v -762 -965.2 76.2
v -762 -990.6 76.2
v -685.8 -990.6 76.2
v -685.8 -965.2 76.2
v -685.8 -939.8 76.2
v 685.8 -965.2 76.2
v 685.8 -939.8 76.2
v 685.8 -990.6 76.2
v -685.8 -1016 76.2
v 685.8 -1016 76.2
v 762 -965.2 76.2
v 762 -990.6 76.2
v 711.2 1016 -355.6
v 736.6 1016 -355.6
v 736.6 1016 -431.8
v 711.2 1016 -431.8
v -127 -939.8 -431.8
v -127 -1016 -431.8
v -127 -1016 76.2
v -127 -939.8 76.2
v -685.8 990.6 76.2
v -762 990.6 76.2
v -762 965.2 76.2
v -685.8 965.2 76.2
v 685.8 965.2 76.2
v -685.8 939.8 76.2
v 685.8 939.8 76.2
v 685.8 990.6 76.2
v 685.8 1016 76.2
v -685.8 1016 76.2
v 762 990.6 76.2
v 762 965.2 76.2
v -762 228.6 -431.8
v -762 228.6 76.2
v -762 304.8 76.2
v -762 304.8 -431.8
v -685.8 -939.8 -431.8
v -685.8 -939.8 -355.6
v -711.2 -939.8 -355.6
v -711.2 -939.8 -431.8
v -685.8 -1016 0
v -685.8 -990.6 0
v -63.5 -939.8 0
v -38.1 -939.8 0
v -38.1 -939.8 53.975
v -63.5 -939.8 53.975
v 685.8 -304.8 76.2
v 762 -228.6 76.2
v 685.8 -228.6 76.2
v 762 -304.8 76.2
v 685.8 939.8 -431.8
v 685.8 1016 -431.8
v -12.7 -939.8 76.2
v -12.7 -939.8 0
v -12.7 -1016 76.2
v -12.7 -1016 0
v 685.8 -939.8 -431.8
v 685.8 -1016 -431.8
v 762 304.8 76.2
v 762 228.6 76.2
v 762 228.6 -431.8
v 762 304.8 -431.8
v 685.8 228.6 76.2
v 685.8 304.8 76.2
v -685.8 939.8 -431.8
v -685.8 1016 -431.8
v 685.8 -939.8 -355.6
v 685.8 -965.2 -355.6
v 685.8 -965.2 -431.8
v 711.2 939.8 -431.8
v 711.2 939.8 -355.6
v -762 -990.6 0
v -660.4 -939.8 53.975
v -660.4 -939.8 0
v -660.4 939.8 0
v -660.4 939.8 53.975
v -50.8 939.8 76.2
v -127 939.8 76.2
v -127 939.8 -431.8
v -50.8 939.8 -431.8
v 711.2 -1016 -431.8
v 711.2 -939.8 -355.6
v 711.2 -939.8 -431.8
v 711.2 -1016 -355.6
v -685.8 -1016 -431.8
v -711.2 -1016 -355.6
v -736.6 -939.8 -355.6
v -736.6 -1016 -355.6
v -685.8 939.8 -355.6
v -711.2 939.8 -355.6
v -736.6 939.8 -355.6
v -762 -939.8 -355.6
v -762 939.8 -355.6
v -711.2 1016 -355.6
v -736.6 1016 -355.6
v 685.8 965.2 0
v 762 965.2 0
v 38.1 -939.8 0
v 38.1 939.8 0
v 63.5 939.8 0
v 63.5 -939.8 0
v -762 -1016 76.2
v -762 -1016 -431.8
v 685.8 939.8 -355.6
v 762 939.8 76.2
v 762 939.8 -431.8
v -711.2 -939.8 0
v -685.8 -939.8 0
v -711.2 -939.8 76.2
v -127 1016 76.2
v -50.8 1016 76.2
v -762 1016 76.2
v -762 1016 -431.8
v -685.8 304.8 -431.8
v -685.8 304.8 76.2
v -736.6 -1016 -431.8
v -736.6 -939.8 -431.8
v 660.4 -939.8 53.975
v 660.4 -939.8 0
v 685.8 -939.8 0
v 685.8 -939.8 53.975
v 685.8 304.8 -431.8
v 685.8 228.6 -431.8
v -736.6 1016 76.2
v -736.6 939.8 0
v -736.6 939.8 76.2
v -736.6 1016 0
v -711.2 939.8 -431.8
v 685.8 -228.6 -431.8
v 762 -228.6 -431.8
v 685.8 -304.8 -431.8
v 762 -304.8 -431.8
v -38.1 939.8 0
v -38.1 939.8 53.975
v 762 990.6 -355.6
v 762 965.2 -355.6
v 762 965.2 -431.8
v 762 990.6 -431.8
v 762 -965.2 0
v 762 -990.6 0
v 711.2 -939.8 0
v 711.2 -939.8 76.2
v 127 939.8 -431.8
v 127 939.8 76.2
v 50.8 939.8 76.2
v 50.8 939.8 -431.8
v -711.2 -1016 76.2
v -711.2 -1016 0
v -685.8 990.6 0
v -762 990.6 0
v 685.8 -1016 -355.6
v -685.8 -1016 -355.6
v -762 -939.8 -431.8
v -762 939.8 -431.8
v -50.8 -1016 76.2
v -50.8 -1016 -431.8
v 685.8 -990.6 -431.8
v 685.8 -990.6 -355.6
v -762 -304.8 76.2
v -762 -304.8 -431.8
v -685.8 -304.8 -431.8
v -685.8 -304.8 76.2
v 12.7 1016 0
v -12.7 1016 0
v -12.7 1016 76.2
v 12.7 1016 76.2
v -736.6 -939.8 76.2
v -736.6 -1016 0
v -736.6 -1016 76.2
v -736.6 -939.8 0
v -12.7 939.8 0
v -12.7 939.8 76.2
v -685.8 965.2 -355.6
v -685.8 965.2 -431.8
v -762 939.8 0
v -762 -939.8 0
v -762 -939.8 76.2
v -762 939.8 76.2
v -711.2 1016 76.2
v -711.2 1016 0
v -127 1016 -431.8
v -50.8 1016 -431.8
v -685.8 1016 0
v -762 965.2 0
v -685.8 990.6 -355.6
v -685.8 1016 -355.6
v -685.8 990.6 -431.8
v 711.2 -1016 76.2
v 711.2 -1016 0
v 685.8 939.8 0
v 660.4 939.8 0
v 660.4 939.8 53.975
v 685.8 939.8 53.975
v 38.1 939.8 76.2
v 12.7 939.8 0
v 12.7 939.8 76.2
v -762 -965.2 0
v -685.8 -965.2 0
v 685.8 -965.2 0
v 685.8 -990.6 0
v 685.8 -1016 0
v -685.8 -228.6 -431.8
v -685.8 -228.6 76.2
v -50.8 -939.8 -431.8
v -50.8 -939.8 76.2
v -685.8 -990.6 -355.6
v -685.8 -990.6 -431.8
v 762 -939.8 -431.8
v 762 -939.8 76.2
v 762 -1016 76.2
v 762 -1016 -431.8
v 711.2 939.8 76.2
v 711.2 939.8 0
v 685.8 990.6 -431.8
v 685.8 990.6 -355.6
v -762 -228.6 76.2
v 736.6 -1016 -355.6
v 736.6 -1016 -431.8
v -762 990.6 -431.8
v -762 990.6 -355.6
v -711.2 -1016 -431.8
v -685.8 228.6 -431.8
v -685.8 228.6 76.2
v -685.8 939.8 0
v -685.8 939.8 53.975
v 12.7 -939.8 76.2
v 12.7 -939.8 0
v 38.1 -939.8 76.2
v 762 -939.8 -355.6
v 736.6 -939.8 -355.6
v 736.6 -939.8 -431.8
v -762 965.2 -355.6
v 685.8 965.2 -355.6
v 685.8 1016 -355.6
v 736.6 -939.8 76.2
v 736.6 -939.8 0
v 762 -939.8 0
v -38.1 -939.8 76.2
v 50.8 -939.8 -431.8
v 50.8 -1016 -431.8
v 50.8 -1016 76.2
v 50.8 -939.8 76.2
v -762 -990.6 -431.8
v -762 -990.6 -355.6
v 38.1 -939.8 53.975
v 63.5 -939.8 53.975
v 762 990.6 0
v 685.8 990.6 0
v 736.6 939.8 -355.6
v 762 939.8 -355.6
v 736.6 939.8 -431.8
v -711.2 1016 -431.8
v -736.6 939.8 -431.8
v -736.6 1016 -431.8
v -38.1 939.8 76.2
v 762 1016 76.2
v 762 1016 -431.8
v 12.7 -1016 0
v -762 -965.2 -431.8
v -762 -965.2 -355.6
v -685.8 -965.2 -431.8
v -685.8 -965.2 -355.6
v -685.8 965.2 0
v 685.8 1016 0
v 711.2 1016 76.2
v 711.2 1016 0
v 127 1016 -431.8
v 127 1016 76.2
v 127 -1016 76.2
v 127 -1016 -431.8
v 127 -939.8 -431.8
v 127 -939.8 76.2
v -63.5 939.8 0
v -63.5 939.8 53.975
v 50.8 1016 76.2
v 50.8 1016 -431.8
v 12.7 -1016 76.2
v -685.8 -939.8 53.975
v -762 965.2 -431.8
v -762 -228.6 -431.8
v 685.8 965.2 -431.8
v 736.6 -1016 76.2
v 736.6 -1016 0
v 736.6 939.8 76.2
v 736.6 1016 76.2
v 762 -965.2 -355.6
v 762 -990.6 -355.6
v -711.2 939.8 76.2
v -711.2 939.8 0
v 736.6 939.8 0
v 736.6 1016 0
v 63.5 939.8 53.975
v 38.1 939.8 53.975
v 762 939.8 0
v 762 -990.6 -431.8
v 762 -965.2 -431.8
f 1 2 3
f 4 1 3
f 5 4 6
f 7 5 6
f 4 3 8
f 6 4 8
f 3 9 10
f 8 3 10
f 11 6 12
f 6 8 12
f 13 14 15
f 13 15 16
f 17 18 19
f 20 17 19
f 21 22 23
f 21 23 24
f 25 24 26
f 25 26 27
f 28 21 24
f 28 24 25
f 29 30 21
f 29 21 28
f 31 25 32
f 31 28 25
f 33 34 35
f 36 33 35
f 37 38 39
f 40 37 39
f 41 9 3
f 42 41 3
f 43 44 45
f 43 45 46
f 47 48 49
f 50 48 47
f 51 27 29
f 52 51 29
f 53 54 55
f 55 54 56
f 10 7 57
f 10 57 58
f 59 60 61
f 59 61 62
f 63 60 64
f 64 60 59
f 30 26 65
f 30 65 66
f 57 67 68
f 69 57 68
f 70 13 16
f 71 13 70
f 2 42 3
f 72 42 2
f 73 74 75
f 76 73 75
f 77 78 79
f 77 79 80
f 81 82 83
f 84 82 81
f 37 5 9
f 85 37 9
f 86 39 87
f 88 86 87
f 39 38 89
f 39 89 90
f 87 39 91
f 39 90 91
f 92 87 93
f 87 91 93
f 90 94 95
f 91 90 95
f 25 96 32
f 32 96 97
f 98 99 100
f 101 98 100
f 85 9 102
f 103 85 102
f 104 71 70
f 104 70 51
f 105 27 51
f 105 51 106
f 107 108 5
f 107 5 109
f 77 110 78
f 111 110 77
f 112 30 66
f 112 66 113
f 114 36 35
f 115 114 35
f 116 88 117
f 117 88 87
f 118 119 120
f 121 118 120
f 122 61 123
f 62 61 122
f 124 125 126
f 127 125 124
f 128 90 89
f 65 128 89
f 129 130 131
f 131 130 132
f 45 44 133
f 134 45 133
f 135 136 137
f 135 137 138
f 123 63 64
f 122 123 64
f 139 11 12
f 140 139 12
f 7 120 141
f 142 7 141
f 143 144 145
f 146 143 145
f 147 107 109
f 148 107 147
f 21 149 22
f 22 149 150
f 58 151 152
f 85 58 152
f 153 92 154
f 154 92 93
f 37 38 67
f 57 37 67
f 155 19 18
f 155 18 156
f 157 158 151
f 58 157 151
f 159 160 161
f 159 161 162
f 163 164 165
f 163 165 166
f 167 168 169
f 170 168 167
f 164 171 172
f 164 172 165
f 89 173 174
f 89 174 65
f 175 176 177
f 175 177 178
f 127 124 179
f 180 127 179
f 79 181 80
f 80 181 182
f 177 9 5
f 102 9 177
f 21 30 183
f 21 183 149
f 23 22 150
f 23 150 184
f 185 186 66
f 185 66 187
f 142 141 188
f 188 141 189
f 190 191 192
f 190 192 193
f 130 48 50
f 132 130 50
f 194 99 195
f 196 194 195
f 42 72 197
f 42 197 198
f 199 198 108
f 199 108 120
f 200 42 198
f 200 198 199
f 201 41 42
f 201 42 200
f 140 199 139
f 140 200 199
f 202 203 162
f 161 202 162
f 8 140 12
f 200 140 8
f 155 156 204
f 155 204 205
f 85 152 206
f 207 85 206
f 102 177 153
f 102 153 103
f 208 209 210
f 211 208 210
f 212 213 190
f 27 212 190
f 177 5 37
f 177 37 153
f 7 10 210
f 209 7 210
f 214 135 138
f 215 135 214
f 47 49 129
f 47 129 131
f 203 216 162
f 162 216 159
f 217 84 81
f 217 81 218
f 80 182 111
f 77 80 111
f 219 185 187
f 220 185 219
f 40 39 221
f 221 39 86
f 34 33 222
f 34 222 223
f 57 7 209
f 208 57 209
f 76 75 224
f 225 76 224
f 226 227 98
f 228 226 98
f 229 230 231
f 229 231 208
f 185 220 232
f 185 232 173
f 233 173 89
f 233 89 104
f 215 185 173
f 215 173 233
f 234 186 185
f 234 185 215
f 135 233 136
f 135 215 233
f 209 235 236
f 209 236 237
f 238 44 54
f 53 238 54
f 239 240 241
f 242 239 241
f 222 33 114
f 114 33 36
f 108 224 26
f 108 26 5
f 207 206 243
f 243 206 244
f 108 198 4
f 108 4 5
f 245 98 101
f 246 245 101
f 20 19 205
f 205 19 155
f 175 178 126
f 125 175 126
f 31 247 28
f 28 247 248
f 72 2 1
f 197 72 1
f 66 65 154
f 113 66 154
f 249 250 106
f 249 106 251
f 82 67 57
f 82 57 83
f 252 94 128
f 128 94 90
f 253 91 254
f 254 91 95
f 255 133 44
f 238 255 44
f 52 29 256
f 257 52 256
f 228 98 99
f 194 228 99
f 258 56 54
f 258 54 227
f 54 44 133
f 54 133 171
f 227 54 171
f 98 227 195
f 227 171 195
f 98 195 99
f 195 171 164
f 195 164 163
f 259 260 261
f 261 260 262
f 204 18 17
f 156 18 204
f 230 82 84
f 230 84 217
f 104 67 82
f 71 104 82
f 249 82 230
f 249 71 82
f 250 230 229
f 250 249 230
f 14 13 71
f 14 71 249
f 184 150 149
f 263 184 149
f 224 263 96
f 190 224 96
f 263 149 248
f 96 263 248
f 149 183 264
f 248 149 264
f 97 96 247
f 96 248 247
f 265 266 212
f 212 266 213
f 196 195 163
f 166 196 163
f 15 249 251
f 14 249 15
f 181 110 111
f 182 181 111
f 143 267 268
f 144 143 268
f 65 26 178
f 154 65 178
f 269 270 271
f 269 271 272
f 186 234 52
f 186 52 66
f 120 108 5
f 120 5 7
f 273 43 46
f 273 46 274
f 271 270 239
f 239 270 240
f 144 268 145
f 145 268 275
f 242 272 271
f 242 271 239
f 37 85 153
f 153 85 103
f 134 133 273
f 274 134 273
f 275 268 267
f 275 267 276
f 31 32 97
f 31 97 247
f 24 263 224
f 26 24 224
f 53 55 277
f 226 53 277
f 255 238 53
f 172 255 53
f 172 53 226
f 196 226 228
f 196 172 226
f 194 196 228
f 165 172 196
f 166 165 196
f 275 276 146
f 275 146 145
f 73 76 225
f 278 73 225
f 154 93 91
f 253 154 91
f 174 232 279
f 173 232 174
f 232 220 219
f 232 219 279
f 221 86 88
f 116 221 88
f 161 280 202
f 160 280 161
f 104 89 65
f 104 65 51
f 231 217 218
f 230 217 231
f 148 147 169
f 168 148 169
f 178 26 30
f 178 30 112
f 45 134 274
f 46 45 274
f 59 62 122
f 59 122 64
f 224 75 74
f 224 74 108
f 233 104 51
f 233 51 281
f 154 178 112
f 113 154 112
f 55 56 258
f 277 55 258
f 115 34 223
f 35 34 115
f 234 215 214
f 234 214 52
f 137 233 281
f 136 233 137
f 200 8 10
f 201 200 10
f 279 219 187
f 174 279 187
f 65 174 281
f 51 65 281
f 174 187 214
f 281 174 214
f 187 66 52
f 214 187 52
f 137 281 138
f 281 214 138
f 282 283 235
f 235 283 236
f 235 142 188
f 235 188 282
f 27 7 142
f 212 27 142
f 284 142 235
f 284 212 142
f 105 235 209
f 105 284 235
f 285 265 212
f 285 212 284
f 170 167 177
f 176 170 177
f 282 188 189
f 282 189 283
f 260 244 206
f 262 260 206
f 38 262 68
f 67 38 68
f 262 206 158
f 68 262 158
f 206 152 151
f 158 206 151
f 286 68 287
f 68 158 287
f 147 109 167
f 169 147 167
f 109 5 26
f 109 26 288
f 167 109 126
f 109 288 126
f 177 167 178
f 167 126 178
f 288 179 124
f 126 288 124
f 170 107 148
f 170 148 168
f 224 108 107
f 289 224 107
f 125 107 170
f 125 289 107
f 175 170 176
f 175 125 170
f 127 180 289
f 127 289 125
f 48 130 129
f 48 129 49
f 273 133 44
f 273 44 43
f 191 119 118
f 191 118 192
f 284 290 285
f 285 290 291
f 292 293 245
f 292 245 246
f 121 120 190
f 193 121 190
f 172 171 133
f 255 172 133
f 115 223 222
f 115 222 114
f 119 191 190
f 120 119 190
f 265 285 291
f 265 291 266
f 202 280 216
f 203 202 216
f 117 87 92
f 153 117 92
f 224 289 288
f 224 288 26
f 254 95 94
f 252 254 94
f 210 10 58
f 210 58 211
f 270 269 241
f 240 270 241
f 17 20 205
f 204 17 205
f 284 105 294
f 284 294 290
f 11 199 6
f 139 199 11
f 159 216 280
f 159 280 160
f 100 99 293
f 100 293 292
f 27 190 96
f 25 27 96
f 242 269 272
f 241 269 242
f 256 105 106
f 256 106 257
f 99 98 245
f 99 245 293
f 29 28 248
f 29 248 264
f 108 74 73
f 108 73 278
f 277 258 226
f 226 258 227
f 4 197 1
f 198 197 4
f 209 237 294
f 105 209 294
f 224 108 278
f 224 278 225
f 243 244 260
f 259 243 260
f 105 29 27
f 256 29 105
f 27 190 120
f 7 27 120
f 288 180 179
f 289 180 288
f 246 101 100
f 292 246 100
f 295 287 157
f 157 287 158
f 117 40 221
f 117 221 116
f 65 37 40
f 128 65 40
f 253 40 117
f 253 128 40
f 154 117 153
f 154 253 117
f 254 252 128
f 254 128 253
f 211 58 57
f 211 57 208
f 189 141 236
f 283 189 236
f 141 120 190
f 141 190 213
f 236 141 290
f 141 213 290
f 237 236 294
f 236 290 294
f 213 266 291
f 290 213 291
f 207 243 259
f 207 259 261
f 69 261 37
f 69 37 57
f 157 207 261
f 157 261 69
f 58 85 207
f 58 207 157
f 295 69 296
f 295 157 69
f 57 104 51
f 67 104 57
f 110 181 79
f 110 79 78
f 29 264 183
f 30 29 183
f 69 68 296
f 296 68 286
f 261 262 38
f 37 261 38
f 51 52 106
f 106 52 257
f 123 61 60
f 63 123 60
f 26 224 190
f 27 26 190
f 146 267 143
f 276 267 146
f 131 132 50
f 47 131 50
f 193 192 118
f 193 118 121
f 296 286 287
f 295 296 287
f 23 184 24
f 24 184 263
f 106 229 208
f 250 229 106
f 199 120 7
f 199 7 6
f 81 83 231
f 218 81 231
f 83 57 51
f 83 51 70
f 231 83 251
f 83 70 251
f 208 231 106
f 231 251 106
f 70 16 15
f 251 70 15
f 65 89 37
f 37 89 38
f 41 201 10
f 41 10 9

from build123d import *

# Parameters (mm, degrees)
F2_DEPTH  = 76.2
F4_DEPTH  = 76.2
F5_W      = 25.4
F5_H      = 76.2
F6_DEPTH  = 76.2
F7_W      = 25.4
F7_H      = 1879.6
F8_DEPTH  = 53.975
F9_W      = 76.2
F9_H      = 76.2
F10_DEPTH = 508
F12_W     = 76.2
F12_H     = 508
F13_DEPTH = 76.2
F14_W     = 76.2
F14_H     = 508
F15_DEPTH = 76.2


with BuildPart() as f2:
    # F1 (on Top) → F2 (new body)
    with BuildSketch(Plane.XY):
        Polygon((685.8, 1016), (-685.8, 1016), (-685.8, 990.6), (-762, 990.6), (-762, 965.2), (-685.8, 965.2), (-685.8, 939.8), (685.8, 939.8), (685.8, 965.2), (762, 965.2), (762, 990.6), (685.8, 990.6), align=None)
    extrude(amount=F2_DEPTH)


with BuildPart() as f4:
    # F3 (on Top) → F4 (new body)
    with BuildSketch(Plane.XY):
        Polygon((762, -939.8), (762, 939.8), (736.6, 939.8), (736.6, 1016), (711.2, 1016), (711.2, 939.8), (685.8, 939.8), (685.8, -939.8), (711.2, -939.8), (711.2, -1016), (736.6, -1016), (736.6, -939.8), align=None)
    extrude(amount=F4_DEPTH)


with BuildPart() as f6:
    # F5 (on Top) → F6 (new body)
    with BuildSketch(Plane.XY):
        with Locations((0, 977.9)):
            Rectangle(F5_W, F5_H)
        Polygon((12.7, 939.8), (-12.7, 939.8), (-38.1, 939.8), (-38.1, -939.8), (-12.7, -939.8), (-12.7, -1016), (12.7, -1016), (12.7, -939.8), (38.1, -939.8), (38.1, 939.8), align=None)
    extrude(amount=F6_DEPTH)


with BuildPart() as f8:
    # F7 (on Top) → F8 (new body)
    with BuildSketch(Plane.XY):
        with Locations((673.1, 0)):
            Rectangle(F7_W, F7_H)
        with Locations((50.8, 0)):
            Rectangle(F7_W, F7_H)
    extrude(amount=F8_DEPTH)


with BuildPart() as f10:
    # F9 (on face) → F10 (new body)
    with BuildSketch(Plane.XY.offset(76.2)):
        with Locations((723.9, 977.9)):
            Rectangle(F9_W, F9_H)
    extrude(amount=-F10_DEPTH)


with BuildPart() as f13:
    # F12 (on face) → F13 (new body)
    with BuildSketch(Plane(origin=(0, 1016, 0), x_dir=(-1, 0, 0), z_dir=(0, 1, 0))):
        with Locations((-88.9, -177.8)):
            Rectangle(F12_W, F12_H)
    extrude(amount=-F13_DEPTH)


with BuildPart() as f15:
    # F14 (on face) → F15 (new body)
    with BuildSketch(Plane.YZ.offset(762)):
        with Locations((266.7, -177.8)):
            Rectangle(F14_W, F14_H)
    extrude(amount=-F15_DEPTH)


with BuildPart() as f16_1:
    # F16: instance of F2
    add(f2.part.mirror(Plane.XZ))


with BuildPart() as f16_2:
    # F16: instance of F13
    add(f13.part.mirror(Plane.XZ))


with BuildPart() as f16_3:
    # F16: instance of F10
    add(f10.part.mirror(Plane.XZ))


with BuildPart() as f16_4:
    # F16: instance of F15
    add(f15.part.mirror(Plane.XZ))


with BuildPart() as f17_1:
    # F17: instance of F16_3
    add(f16_3.part.mirror(Plane.YZ))


with BuildPart() as f17_2:
    # F17: instance of F16_2
    add(f16_2.part.mirror(Plane.YZ))


with BuildPart() as f17_3:
    # F17: instance of F16_4
    add(f16_4.part.mirror(Plane.YZ))


with BuildPart() as f17_4:
    # F17: instance of F15
    add(f15.part.mirror(Plane.YZ))


with BuildPart() as f17_5:
    # F17: instance of F10
    add(f10.part.mirror(Plane.YZ))


with BuildPart() as f17_6:
    # F17: instance of F13
    add(f13.part.mirror(Plane.YZ))


with BuildPart() as f17_7:
    # F17: instance of F8
    add(f8.part.mirror(Plane.YZ))


with BuildPart() as f17_8:
    # F17: instance of F4
    add(f4.part.mirror(Plane.YZ))


with BuildPart() as f18_1:
    # F18: instance of F16_1
    add(f16_1.part.mirror(Plane.XY.offset(-177.8)))


with BuildPart() as f18_2:
    # F18: instance of F4
    add(f4.part.mirror(Plane.XY.offset(-177.8)))


with BuildPart() as f18_3:
    # F18: instance of F2
    add(f2.part.mirror(Plane.XY.offset(-177.8)))


with BuildPart() as f18_4:
    # F18: instance of F17_8
    add(f17_8.part.mirror(Plane.XY.offset(-177.8)))


solid = Compound([f2.part, f4.part, f6.part, f8.part, f10.part, f13.part, f15.part, f16_1.part, f16_2.part, f16_3.part, f16_4.part, f17_1.part, f17_2.part, f17_3.part, f17_4.part, f17_5.part, f17_6.part, f17_7.part, f17_8.part, f18_1.part, f18_2.part, f18_3.part, f18_4.part])
